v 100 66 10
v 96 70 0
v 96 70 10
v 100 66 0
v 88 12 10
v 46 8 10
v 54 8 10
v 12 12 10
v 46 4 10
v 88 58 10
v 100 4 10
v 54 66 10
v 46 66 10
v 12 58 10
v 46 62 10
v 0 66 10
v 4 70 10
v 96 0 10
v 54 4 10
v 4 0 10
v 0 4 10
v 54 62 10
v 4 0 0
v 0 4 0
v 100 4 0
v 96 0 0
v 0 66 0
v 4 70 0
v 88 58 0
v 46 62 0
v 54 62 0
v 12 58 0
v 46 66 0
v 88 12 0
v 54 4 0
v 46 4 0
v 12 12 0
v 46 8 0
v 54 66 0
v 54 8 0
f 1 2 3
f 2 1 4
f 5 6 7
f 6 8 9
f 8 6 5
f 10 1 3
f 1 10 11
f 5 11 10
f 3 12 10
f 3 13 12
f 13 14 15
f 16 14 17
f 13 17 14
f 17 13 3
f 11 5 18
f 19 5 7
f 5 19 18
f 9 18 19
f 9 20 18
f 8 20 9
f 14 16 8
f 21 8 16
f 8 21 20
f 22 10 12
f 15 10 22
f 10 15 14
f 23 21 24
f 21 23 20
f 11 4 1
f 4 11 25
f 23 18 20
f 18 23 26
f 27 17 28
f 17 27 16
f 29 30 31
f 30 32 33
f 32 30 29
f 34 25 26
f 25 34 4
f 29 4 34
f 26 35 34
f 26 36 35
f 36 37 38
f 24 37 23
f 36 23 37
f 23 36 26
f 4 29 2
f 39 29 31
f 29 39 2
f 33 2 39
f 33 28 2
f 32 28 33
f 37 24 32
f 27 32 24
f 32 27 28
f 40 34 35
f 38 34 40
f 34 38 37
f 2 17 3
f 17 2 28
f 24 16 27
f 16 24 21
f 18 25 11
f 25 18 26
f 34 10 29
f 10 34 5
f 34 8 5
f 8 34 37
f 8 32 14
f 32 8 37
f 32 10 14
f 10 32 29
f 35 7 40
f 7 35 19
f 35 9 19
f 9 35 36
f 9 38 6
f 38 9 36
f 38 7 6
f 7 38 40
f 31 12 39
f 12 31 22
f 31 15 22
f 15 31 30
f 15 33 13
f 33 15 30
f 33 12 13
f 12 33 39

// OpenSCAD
$fn = 32;

// ----------------------------------------------------------------------
// Frame plate: 100 x 70 frame, 12 mm rails
// ----------------------------------------------------------------------

// --- parameters (mm) ---
plate_l = 100;            // plate length, X
plate_w = 70;             // plate width, Y
plate_t = 10;             // plate thickness, Z (extrusion height)
corner_c = 4;             // corner chamfer
frame_bar = 12;           // frame rail width
slot_l = 8;               // adjustment slot length
slot_w = 4;               // adjustment slot width
fit_tol = 0.05;           // declared fit tolerance (prompt contract)
free_tol = 0.2;           // declared free tolerance (prompt contract)

win_l = plate_l - 2 * frame_bar;  // window length
win_w = plate_w - 2 * frame_bar;  // window width

profile = [[4, 0], [96, 0], [100, 4], [100, 66], [96, 70], [4, 70], [0, 66], [0, 4]];  // primary outline, 8 points, counter clockwise
void_1 = [[12, 12], [88, 12], [88, 58], [12, 58]];  // the window, 4 points
void_2 = [[46, 4], [54, 4], [54, 8], [46, 8]];  // adjustment slot, 4 points
void_3 = [[46, 62], [54, 62], [54, 66], [46, 66]];  // adjustment slot, 4 points

// --- the one profile operation ---
difference() {
  linear_extrude(height = plate_t) polygon(points = profile);
  translate([0, 0, -1])
    linear_extrude(height = plate_t + 2) polygon(points = void_1);
  translate([0, 0, -1])
    linear_extrude(height = plate_t + 2) polygon(points = void_2);
  translate([0, 0, -1])
    linear_extrude(height = plate_t + 2) polygon(points = void_3);
}
